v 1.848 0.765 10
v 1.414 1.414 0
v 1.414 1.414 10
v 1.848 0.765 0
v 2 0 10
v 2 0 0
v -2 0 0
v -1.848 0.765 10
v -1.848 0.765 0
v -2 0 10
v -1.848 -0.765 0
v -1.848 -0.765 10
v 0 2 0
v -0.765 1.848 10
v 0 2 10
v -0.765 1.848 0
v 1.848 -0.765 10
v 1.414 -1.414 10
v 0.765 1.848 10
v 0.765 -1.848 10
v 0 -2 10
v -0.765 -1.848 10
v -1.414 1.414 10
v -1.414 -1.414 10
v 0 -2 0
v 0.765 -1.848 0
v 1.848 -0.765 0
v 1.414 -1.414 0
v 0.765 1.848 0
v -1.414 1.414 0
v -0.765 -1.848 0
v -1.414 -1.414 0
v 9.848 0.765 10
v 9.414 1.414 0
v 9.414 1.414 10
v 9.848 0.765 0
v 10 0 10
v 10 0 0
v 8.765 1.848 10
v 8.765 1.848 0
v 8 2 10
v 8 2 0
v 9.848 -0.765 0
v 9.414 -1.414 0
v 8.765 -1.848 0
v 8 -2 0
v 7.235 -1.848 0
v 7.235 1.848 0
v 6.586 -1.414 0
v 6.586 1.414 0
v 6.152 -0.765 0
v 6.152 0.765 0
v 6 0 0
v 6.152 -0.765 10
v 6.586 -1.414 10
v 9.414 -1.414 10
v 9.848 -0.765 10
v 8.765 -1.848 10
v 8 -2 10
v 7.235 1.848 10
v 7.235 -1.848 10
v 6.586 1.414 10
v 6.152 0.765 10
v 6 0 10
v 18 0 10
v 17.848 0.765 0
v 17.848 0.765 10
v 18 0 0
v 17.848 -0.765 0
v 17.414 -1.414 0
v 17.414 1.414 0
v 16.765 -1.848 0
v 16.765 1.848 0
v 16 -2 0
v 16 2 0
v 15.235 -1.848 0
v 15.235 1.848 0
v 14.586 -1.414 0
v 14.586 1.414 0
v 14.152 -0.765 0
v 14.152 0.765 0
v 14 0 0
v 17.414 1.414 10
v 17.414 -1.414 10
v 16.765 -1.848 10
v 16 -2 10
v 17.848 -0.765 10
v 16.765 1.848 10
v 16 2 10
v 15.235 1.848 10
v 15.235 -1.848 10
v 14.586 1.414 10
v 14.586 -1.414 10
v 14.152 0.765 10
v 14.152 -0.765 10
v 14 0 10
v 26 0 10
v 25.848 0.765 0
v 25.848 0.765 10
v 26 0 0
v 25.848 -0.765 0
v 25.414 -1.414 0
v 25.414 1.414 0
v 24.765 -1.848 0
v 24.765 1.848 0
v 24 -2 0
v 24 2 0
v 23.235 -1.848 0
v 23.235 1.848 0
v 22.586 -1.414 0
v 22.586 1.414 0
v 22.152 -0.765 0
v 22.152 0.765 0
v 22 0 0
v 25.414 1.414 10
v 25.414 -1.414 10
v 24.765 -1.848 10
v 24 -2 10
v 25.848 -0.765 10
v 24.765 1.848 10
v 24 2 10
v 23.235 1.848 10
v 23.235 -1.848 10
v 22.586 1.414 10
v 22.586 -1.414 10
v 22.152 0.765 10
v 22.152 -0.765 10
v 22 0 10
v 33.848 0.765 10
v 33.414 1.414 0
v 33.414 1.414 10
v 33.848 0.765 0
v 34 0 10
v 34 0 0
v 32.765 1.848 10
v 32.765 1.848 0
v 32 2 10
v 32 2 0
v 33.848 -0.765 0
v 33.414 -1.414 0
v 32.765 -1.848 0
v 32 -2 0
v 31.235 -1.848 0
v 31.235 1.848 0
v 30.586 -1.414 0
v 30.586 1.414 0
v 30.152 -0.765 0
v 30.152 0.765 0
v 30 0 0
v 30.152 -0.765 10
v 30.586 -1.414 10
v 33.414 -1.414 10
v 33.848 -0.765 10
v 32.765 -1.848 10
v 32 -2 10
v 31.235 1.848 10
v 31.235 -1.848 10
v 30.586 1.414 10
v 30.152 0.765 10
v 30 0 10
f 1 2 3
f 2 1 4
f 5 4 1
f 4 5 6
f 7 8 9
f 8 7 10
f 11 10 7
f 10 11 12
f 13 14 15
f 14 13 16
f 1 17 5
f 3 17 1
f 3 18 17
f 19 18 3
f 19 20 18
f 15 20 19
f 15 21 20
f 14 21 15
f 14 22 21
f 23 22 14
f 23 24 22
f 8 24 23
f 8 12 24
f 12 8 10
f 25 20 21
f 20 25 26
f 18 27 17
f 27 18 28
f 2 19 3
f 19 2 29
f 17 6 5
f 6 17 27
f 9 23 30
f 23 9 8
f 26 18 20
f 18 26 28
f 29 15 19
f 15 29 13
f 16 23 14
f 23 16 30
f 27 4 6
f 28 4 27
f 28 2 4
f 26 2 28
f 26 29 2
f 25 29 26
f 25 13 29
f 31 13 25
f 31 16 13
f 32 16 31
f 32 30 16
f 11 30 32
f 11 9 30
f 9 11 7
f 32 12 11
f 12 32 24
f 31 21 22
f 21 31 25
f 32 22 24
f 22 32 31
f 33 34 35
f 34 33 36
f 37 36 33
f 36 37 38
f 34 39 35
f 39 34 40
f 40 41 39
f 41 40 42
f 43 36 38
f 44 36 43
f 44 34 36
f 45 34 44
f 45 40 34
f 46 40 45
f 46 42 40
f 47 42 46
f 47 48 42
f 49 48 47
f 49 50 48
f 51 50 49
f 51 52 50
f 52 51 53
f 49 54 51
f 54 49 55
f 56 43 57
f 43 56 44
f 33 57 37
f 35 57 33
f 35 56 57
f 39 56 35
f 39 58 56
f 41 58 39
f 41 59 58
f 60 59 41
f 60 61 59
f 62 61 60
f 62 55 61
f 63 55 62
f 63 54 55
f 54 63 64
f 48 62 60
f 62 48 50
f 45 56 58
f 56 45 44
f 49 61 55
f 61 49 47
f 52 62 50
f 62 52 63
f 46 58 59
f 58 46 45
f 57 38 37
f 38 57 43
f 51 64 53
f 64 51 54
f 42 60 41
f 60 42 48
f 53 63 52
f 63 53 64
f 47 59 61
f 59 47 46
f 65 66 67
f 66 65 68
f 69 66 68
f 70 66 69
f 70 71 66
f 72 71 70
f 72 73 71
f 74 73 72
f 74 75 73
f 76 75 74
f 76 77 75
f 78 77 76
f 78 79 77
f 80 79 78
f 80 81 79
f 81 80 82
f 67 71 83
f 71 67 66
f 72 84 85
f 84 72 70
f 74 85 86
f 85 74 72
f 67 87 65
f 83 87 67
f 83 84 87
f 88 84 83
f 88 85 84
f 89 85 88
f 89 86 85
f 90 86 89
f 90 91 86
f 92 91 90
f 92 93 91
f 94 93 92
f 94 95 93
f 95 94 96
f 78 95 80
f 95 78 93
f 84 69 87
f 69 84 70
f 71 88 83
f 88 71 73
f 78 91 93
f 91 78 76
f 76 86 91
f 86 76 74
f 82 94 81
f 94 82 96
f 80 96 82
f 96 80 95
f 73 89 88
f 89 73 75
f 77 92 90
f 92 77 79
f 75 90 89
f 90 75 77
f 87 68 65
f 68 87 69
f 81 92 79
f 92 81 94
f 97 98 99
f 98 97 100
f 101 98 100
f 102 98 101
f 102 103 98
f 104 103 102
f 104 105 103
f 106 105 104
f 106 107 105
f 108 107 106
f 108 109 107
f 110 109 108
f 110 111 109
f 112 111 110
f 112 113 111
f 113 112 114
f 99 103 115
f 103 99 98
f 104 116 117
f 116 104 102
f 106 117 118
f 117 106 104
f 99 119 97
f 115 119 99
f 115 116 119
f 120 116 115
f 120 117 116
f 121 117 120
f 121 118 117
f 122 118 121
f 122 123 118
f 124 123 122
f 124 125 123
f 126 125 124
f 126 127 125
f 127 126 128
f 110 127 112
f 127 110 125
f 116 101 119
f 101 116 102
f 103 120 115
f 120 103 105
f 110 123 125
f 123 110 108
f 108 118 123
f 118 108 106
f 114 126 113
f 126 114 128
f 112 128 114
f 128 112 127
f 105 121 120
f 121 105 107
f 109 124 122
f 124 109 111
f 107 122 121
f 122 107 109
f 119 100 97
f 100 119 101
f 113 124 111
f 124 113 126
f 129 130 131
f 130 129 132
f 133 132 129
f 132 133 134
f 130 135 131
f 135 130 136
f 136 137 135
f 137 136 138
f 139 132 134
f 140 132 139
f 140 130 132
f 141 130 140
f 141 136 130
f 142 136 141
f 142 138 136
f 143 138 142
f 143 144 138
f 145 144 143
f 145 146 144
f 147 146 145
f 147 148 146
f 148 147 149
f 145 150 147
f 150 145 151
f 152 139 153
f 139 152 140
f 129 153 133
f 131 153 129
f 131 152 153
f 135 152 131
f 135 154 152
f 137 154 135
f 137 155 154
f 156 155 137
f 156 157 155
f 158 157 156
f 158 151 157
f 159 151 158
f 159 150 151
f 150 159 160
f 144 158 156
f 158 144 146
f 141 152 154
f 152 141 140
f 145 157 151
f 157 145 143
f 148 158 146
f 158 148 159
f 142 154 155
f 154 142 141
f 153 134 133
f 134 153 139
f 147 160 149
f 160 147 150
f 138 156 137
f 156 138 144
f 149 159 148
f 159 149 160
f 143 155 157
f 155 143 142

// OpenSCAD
// Generated by scadwright. Do not hand-edit —
// edit the Python source and regenerate.

$fn = 16;

union() {
    cylinder(h=10, r=2, center=false);

    translate([8, 0, 0]) {
        cylinder(h=10, r=2, center=false);
    }

    translate([16, 0, 0]) {
        cylinder(h=10, r=2, center=false);
    }

    translate([24, 0, 0]) {
        cylinder(h=10, r=2, center=false);
    }

    translate([32, 0, 0]) {
        cylinder(h=10, r=2, center=false);
    }
}
